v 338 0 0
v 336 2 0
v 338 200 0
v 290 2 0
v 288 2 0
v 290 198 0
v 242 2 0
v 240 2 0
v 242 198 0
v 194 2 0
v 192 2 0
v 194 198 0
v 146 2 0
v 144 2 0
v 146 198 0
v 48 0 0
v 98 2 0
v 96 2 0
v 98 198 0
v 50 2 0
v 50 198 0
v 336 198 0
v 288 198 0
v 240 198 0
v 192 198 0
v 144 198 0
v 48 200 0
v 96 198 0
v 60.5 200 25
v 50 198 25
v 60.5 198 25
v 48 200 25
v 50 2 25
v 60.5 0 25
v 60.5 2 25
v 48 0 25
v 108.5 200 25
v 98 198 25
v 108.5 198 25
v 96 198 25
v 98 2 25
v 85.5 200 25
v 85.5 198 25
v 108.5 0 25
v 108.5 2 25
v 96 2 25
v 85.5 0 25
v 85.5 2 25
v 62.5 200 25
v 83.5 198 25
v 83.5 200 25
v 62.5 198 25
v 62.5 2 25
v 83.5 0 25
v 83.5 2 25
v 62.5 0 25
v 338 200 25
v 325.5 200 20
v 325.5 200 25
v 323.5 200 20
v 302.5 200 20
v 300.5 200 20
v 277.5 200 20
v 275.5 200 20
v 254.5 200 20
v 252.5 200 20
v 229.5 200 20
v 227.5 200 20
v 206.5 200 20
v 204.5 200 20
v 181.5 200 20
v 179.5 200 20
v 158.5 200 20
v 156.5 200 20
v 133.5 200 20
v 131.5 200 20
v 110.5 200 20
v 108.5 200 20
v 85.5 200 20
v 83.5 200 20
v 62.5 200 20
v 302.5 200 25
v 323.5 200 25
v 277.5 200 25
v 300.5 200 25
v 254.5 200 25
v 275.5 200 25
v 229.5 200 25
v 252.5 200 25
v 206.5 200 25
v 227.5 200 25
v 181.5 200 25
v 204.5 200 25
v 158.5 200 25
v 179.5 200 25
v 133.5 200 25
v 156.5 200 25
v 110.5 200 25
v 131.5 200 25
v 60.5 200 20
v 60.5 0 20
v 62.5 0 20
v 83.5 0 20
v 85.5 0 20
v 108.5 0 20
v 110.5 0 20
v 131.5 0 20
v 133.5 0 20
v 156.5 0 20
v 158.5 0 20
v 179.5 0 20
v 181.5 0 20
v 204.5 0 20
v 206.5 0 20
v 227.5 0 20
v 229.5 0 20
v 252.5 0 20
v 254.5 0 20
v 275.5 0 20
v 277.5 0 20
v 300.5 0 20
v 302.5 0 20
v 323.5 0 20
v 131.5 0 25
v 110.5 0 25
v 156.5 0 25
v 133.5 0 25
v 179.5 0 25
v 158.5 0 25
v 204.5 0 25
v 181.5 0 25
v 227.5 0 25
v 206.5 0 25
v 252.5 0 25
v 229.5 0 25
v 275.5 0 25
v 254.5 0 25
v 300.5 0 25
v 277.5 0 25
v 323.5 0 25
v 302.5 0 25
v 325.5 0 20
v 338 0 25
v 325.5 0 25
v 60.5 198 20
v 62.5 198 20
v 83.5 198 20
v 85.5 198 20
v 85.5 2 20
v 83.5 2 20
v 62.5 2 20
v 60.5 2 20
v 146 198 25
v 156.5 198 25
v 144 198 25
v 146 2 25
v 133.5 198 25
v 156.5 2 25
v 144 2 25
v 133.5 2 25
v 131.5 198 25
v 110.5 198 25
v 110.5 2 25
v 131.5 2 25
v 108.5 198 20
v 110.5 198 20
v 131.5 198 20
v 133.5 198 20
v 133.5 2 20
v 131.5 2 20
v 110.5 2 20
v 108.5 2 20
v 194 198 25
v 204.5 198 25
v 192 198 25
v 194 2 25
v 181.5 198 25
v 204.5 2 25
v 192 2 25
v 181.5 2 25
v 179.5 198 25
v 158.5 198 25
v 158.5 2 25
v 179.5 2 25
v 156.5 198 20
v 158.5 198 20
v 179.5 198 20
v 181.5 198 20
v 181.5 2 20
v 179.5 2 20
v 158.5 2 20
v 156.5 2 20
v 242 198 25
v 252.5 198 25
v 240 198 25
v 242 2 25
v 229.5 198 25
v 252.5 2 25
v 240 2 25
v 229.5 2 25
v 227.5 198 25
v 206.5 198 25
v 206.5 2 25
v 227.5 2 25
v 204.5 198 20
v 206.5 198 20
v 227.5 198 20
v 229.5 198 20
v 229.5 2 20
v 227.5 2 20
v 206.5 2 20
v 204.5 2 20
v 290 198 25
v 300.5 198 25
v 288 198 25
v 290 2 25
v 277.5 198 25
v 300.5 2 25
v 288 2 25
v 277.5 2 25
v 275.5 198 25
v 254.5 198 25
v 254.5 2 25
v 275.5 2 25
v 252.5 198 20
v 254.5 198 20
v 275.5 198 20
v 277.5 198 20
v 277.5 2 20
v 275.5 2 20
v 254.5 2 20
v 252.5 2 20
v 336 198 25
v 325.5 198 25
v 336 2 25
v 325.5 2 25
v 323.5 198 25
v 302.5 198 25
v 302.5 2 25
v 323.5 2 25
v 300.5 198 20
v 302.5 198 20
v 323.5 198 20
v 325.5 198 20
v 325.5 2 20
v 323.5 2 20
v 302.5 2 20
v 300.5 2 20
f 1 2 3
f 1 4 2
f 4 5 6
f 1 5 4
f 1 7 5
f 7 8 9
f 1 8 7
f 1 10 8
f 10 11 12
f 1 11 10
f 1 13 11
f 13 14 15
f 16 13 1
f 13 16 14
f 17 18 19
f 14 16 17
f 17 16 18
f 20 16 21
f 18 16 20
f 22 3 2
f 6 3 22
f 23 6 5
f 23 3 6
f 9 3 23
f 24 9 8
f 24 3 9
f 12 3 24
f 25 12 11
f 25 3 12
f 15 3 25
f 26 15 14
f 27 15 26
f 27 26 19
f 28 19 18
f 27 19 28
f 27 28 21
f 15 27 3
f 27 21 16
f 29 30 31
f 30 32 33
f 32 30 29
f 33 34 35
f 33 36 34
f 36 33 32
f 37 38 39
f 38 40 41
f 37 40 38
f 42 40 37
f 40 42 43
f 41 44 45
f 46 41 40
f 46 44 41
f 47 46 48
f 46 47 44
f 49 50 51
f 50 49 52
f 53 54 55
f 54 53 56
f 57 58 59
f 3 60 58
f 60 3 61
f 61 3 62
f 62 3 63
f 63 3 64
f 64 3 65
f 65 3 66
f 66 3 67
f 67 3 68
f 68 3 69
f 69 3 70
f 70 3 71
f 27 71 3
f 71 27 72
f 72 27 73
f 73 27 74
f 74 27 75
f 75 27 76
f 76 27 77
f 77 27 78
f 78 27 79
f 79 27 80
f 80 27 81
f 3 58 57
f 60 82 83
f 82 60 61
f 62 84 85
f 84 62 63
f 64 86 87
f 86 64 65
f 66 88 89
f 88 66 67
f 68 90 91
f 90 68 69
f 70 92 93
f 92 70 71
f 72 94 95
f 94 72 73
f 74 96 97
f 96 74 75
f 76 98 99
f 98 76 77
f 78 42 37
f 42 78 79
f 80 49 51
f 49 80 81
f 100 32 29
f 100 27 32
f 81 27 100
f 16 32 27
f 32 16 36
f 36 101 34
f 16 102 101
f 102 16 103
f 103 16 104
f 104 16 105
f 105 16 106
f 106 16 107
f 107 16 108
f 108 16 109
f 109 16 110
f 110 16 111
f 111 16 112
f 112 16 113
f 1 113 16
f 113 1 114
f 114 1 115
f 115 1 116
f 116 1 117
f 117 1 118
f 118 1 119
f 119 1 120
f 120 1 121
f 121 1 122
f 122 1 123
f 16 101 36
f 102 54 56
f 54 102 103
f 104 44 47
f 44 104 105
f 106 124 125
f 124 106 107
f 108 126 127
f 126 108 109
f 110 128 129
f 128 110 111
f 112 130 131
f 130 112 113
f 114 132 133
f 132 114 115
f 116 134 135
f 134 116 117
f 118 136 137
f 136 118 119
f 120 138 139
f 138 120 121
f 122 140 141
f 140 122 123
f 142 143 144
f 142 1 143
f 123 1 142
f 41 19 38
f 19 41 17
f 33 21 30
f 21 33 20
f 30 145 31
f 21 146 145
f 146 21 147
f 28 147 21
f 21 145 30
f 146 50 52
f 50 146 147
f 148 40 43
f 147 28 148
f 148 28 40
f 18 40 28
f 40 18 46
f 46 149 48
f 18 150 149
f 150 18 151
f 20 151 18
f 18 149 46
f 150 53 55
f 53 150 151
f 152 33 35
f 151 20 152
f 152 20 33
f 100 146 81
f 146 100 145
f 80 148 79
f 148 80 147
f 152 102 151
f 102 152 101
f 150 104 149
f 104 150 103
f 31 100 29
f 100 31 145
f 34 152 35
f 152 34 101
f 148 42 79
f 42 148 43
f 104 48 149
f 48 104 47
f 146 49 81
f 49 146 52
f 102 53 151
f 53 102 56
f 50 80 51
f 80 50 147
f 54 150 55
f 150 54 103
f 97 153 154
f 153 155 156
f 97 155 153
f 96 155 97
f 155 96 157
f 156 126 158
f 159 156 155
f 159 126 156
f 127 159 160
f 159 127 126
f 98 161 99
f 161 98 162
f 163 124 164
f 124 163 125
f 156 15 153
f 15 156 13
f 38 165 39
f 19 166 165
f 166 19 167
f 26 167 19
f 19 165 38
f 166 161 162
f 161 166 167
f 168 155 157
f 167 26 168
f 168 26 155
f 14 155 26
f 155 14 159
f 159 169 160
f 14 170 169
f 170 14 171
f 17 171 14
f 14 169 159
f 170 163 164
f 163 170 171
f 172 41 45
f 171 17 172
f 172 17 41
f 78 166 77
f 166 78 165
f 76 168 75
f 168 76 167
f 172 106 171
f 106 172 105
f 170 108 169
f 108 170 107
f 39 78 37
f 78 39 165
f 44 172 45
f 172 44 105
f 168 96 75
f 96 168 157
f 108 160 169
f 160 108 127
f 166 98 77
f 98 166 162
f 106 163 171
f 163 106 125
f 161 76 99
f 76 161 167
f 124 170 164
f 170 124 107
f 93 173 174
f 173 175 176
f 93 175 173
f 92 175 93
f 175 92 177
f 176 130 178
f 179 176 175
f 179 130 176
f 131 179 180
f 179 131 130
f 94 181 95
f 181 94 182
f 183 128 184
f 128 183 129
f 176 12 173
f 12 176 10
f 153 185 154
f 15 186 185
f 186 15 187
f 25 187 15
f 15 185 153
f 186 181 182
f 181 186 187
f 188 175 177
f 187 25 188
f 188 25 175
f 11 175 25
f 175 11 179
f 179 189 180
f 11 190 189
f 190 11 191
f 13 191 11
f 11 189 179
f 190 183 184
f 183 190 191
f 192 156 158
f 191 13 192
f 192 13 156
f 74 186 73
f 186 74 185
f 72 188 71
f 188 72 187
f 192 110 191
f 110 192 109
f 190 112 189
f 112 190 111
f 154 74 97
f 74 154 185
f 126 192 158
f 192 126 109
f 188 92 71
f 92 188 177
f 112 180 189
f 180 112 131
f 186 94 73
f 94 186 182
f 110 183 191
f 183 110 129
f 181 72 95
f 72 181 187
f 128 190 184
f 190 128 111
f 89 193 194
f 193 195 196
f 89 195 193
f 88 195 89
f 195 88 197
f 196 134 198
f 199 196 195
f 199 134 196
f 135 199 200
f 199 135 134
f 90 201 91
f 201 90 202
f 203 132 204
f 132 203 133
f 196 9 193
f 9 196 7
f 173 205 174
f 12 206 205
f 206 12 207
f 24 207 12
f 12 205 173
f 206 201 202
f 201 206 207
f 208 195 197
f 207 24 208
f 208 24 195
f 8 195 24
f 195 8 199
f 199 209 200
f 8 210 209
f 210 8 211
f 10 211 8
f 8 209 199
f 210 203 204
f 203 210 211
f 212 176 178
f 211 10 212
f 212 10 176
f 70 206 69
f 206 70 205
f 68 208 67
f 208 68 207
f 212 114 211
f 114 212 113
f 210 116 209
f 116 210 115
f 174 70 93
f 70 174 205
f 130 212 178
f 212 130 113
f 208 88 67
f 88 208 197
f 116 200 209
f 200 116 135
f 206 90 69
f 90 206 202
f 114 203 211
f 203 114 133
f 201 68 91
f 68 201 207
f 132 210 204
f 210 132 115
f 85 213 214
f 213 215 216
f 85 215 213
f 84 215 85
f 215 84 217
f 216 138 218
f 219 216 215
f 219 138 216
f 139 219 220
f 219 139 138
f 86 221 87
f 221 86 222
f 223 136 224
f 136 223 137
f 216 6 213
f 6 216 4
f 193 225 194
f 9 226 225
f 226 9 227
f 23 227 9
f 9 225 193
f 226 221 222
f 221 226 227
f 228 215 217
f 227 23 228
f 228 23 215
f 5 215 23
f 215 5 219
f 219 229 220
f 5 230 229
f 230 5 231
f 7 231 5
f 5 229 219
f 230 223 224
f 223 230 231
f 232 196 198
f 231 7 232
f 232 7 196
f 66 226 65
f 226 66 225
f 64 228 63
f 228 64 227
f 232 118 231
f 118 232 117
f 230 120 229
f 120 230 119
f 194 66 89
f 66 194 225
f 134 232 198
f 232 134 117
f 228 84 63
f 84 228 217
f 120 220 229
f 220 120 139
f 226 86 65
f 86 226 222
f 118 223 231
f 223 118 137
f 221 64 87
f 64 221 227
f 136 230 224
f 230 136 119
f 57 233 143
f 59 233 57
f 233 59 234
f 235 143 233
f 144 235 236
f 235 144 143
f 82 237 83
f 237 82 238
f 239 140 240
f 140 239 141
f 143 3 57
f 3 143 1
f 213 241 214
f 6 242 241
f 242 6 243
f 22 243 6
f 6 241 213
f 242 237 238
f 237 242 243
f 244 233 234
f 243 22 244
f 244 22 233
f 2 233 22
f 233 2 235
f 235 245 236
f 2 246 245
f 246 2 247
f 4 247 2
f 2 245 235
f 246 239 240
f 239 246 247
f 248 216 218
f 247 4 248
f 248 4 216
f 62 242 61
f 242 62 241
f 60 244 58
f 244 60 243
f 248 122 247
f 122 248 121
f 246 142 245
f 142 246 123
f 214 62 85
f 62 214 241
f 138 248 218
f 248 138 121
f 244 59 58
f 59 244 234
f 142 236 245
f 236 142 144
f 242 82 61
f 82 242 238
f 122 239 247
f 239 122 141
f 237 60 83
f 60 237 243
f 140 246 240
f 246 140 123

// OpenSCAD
/*
1/9/18 supports for microgreens.
*/

$fn=100;


module tube(outerDiameter, wallThickness, height)
{
    linear_extrude(height,true)
    difference()
    {
        circle(outerDiameter,true);
        circle(outerDiameter-wallThickness,true);
    }
}

module squareTube(width,depth,height,wall)
{
        w = width;
        d = depth;
        q = wall;  
    
    a=[[0,0],[w,0],[w,d],[0,d]];
    aa=[[q,q],[w-q,q],[w-q,d-q],[q,d-q]];
    p=[[0,1,2,3],[4,5,6,7]];
    aaa=concat(a,aa);
    
    echo("",aaa);
    
    linear_extrude(height,true)
    polygon(aaa,p,10);
}


module microgreenSupport(rows, width,depth,height,wall)
{
        for(x = [1:rows])
        {
            translate([(x*(width-wall)),0,0])
            difference()
                {
                squareTube(width,depth,height,wall);
                translate([width/4,-10,height*.8])
                squareTube(width/2,depth+20,height/3,wall);
                }
        }
    
}
microgreenSupport(6,50,200,25,2);
